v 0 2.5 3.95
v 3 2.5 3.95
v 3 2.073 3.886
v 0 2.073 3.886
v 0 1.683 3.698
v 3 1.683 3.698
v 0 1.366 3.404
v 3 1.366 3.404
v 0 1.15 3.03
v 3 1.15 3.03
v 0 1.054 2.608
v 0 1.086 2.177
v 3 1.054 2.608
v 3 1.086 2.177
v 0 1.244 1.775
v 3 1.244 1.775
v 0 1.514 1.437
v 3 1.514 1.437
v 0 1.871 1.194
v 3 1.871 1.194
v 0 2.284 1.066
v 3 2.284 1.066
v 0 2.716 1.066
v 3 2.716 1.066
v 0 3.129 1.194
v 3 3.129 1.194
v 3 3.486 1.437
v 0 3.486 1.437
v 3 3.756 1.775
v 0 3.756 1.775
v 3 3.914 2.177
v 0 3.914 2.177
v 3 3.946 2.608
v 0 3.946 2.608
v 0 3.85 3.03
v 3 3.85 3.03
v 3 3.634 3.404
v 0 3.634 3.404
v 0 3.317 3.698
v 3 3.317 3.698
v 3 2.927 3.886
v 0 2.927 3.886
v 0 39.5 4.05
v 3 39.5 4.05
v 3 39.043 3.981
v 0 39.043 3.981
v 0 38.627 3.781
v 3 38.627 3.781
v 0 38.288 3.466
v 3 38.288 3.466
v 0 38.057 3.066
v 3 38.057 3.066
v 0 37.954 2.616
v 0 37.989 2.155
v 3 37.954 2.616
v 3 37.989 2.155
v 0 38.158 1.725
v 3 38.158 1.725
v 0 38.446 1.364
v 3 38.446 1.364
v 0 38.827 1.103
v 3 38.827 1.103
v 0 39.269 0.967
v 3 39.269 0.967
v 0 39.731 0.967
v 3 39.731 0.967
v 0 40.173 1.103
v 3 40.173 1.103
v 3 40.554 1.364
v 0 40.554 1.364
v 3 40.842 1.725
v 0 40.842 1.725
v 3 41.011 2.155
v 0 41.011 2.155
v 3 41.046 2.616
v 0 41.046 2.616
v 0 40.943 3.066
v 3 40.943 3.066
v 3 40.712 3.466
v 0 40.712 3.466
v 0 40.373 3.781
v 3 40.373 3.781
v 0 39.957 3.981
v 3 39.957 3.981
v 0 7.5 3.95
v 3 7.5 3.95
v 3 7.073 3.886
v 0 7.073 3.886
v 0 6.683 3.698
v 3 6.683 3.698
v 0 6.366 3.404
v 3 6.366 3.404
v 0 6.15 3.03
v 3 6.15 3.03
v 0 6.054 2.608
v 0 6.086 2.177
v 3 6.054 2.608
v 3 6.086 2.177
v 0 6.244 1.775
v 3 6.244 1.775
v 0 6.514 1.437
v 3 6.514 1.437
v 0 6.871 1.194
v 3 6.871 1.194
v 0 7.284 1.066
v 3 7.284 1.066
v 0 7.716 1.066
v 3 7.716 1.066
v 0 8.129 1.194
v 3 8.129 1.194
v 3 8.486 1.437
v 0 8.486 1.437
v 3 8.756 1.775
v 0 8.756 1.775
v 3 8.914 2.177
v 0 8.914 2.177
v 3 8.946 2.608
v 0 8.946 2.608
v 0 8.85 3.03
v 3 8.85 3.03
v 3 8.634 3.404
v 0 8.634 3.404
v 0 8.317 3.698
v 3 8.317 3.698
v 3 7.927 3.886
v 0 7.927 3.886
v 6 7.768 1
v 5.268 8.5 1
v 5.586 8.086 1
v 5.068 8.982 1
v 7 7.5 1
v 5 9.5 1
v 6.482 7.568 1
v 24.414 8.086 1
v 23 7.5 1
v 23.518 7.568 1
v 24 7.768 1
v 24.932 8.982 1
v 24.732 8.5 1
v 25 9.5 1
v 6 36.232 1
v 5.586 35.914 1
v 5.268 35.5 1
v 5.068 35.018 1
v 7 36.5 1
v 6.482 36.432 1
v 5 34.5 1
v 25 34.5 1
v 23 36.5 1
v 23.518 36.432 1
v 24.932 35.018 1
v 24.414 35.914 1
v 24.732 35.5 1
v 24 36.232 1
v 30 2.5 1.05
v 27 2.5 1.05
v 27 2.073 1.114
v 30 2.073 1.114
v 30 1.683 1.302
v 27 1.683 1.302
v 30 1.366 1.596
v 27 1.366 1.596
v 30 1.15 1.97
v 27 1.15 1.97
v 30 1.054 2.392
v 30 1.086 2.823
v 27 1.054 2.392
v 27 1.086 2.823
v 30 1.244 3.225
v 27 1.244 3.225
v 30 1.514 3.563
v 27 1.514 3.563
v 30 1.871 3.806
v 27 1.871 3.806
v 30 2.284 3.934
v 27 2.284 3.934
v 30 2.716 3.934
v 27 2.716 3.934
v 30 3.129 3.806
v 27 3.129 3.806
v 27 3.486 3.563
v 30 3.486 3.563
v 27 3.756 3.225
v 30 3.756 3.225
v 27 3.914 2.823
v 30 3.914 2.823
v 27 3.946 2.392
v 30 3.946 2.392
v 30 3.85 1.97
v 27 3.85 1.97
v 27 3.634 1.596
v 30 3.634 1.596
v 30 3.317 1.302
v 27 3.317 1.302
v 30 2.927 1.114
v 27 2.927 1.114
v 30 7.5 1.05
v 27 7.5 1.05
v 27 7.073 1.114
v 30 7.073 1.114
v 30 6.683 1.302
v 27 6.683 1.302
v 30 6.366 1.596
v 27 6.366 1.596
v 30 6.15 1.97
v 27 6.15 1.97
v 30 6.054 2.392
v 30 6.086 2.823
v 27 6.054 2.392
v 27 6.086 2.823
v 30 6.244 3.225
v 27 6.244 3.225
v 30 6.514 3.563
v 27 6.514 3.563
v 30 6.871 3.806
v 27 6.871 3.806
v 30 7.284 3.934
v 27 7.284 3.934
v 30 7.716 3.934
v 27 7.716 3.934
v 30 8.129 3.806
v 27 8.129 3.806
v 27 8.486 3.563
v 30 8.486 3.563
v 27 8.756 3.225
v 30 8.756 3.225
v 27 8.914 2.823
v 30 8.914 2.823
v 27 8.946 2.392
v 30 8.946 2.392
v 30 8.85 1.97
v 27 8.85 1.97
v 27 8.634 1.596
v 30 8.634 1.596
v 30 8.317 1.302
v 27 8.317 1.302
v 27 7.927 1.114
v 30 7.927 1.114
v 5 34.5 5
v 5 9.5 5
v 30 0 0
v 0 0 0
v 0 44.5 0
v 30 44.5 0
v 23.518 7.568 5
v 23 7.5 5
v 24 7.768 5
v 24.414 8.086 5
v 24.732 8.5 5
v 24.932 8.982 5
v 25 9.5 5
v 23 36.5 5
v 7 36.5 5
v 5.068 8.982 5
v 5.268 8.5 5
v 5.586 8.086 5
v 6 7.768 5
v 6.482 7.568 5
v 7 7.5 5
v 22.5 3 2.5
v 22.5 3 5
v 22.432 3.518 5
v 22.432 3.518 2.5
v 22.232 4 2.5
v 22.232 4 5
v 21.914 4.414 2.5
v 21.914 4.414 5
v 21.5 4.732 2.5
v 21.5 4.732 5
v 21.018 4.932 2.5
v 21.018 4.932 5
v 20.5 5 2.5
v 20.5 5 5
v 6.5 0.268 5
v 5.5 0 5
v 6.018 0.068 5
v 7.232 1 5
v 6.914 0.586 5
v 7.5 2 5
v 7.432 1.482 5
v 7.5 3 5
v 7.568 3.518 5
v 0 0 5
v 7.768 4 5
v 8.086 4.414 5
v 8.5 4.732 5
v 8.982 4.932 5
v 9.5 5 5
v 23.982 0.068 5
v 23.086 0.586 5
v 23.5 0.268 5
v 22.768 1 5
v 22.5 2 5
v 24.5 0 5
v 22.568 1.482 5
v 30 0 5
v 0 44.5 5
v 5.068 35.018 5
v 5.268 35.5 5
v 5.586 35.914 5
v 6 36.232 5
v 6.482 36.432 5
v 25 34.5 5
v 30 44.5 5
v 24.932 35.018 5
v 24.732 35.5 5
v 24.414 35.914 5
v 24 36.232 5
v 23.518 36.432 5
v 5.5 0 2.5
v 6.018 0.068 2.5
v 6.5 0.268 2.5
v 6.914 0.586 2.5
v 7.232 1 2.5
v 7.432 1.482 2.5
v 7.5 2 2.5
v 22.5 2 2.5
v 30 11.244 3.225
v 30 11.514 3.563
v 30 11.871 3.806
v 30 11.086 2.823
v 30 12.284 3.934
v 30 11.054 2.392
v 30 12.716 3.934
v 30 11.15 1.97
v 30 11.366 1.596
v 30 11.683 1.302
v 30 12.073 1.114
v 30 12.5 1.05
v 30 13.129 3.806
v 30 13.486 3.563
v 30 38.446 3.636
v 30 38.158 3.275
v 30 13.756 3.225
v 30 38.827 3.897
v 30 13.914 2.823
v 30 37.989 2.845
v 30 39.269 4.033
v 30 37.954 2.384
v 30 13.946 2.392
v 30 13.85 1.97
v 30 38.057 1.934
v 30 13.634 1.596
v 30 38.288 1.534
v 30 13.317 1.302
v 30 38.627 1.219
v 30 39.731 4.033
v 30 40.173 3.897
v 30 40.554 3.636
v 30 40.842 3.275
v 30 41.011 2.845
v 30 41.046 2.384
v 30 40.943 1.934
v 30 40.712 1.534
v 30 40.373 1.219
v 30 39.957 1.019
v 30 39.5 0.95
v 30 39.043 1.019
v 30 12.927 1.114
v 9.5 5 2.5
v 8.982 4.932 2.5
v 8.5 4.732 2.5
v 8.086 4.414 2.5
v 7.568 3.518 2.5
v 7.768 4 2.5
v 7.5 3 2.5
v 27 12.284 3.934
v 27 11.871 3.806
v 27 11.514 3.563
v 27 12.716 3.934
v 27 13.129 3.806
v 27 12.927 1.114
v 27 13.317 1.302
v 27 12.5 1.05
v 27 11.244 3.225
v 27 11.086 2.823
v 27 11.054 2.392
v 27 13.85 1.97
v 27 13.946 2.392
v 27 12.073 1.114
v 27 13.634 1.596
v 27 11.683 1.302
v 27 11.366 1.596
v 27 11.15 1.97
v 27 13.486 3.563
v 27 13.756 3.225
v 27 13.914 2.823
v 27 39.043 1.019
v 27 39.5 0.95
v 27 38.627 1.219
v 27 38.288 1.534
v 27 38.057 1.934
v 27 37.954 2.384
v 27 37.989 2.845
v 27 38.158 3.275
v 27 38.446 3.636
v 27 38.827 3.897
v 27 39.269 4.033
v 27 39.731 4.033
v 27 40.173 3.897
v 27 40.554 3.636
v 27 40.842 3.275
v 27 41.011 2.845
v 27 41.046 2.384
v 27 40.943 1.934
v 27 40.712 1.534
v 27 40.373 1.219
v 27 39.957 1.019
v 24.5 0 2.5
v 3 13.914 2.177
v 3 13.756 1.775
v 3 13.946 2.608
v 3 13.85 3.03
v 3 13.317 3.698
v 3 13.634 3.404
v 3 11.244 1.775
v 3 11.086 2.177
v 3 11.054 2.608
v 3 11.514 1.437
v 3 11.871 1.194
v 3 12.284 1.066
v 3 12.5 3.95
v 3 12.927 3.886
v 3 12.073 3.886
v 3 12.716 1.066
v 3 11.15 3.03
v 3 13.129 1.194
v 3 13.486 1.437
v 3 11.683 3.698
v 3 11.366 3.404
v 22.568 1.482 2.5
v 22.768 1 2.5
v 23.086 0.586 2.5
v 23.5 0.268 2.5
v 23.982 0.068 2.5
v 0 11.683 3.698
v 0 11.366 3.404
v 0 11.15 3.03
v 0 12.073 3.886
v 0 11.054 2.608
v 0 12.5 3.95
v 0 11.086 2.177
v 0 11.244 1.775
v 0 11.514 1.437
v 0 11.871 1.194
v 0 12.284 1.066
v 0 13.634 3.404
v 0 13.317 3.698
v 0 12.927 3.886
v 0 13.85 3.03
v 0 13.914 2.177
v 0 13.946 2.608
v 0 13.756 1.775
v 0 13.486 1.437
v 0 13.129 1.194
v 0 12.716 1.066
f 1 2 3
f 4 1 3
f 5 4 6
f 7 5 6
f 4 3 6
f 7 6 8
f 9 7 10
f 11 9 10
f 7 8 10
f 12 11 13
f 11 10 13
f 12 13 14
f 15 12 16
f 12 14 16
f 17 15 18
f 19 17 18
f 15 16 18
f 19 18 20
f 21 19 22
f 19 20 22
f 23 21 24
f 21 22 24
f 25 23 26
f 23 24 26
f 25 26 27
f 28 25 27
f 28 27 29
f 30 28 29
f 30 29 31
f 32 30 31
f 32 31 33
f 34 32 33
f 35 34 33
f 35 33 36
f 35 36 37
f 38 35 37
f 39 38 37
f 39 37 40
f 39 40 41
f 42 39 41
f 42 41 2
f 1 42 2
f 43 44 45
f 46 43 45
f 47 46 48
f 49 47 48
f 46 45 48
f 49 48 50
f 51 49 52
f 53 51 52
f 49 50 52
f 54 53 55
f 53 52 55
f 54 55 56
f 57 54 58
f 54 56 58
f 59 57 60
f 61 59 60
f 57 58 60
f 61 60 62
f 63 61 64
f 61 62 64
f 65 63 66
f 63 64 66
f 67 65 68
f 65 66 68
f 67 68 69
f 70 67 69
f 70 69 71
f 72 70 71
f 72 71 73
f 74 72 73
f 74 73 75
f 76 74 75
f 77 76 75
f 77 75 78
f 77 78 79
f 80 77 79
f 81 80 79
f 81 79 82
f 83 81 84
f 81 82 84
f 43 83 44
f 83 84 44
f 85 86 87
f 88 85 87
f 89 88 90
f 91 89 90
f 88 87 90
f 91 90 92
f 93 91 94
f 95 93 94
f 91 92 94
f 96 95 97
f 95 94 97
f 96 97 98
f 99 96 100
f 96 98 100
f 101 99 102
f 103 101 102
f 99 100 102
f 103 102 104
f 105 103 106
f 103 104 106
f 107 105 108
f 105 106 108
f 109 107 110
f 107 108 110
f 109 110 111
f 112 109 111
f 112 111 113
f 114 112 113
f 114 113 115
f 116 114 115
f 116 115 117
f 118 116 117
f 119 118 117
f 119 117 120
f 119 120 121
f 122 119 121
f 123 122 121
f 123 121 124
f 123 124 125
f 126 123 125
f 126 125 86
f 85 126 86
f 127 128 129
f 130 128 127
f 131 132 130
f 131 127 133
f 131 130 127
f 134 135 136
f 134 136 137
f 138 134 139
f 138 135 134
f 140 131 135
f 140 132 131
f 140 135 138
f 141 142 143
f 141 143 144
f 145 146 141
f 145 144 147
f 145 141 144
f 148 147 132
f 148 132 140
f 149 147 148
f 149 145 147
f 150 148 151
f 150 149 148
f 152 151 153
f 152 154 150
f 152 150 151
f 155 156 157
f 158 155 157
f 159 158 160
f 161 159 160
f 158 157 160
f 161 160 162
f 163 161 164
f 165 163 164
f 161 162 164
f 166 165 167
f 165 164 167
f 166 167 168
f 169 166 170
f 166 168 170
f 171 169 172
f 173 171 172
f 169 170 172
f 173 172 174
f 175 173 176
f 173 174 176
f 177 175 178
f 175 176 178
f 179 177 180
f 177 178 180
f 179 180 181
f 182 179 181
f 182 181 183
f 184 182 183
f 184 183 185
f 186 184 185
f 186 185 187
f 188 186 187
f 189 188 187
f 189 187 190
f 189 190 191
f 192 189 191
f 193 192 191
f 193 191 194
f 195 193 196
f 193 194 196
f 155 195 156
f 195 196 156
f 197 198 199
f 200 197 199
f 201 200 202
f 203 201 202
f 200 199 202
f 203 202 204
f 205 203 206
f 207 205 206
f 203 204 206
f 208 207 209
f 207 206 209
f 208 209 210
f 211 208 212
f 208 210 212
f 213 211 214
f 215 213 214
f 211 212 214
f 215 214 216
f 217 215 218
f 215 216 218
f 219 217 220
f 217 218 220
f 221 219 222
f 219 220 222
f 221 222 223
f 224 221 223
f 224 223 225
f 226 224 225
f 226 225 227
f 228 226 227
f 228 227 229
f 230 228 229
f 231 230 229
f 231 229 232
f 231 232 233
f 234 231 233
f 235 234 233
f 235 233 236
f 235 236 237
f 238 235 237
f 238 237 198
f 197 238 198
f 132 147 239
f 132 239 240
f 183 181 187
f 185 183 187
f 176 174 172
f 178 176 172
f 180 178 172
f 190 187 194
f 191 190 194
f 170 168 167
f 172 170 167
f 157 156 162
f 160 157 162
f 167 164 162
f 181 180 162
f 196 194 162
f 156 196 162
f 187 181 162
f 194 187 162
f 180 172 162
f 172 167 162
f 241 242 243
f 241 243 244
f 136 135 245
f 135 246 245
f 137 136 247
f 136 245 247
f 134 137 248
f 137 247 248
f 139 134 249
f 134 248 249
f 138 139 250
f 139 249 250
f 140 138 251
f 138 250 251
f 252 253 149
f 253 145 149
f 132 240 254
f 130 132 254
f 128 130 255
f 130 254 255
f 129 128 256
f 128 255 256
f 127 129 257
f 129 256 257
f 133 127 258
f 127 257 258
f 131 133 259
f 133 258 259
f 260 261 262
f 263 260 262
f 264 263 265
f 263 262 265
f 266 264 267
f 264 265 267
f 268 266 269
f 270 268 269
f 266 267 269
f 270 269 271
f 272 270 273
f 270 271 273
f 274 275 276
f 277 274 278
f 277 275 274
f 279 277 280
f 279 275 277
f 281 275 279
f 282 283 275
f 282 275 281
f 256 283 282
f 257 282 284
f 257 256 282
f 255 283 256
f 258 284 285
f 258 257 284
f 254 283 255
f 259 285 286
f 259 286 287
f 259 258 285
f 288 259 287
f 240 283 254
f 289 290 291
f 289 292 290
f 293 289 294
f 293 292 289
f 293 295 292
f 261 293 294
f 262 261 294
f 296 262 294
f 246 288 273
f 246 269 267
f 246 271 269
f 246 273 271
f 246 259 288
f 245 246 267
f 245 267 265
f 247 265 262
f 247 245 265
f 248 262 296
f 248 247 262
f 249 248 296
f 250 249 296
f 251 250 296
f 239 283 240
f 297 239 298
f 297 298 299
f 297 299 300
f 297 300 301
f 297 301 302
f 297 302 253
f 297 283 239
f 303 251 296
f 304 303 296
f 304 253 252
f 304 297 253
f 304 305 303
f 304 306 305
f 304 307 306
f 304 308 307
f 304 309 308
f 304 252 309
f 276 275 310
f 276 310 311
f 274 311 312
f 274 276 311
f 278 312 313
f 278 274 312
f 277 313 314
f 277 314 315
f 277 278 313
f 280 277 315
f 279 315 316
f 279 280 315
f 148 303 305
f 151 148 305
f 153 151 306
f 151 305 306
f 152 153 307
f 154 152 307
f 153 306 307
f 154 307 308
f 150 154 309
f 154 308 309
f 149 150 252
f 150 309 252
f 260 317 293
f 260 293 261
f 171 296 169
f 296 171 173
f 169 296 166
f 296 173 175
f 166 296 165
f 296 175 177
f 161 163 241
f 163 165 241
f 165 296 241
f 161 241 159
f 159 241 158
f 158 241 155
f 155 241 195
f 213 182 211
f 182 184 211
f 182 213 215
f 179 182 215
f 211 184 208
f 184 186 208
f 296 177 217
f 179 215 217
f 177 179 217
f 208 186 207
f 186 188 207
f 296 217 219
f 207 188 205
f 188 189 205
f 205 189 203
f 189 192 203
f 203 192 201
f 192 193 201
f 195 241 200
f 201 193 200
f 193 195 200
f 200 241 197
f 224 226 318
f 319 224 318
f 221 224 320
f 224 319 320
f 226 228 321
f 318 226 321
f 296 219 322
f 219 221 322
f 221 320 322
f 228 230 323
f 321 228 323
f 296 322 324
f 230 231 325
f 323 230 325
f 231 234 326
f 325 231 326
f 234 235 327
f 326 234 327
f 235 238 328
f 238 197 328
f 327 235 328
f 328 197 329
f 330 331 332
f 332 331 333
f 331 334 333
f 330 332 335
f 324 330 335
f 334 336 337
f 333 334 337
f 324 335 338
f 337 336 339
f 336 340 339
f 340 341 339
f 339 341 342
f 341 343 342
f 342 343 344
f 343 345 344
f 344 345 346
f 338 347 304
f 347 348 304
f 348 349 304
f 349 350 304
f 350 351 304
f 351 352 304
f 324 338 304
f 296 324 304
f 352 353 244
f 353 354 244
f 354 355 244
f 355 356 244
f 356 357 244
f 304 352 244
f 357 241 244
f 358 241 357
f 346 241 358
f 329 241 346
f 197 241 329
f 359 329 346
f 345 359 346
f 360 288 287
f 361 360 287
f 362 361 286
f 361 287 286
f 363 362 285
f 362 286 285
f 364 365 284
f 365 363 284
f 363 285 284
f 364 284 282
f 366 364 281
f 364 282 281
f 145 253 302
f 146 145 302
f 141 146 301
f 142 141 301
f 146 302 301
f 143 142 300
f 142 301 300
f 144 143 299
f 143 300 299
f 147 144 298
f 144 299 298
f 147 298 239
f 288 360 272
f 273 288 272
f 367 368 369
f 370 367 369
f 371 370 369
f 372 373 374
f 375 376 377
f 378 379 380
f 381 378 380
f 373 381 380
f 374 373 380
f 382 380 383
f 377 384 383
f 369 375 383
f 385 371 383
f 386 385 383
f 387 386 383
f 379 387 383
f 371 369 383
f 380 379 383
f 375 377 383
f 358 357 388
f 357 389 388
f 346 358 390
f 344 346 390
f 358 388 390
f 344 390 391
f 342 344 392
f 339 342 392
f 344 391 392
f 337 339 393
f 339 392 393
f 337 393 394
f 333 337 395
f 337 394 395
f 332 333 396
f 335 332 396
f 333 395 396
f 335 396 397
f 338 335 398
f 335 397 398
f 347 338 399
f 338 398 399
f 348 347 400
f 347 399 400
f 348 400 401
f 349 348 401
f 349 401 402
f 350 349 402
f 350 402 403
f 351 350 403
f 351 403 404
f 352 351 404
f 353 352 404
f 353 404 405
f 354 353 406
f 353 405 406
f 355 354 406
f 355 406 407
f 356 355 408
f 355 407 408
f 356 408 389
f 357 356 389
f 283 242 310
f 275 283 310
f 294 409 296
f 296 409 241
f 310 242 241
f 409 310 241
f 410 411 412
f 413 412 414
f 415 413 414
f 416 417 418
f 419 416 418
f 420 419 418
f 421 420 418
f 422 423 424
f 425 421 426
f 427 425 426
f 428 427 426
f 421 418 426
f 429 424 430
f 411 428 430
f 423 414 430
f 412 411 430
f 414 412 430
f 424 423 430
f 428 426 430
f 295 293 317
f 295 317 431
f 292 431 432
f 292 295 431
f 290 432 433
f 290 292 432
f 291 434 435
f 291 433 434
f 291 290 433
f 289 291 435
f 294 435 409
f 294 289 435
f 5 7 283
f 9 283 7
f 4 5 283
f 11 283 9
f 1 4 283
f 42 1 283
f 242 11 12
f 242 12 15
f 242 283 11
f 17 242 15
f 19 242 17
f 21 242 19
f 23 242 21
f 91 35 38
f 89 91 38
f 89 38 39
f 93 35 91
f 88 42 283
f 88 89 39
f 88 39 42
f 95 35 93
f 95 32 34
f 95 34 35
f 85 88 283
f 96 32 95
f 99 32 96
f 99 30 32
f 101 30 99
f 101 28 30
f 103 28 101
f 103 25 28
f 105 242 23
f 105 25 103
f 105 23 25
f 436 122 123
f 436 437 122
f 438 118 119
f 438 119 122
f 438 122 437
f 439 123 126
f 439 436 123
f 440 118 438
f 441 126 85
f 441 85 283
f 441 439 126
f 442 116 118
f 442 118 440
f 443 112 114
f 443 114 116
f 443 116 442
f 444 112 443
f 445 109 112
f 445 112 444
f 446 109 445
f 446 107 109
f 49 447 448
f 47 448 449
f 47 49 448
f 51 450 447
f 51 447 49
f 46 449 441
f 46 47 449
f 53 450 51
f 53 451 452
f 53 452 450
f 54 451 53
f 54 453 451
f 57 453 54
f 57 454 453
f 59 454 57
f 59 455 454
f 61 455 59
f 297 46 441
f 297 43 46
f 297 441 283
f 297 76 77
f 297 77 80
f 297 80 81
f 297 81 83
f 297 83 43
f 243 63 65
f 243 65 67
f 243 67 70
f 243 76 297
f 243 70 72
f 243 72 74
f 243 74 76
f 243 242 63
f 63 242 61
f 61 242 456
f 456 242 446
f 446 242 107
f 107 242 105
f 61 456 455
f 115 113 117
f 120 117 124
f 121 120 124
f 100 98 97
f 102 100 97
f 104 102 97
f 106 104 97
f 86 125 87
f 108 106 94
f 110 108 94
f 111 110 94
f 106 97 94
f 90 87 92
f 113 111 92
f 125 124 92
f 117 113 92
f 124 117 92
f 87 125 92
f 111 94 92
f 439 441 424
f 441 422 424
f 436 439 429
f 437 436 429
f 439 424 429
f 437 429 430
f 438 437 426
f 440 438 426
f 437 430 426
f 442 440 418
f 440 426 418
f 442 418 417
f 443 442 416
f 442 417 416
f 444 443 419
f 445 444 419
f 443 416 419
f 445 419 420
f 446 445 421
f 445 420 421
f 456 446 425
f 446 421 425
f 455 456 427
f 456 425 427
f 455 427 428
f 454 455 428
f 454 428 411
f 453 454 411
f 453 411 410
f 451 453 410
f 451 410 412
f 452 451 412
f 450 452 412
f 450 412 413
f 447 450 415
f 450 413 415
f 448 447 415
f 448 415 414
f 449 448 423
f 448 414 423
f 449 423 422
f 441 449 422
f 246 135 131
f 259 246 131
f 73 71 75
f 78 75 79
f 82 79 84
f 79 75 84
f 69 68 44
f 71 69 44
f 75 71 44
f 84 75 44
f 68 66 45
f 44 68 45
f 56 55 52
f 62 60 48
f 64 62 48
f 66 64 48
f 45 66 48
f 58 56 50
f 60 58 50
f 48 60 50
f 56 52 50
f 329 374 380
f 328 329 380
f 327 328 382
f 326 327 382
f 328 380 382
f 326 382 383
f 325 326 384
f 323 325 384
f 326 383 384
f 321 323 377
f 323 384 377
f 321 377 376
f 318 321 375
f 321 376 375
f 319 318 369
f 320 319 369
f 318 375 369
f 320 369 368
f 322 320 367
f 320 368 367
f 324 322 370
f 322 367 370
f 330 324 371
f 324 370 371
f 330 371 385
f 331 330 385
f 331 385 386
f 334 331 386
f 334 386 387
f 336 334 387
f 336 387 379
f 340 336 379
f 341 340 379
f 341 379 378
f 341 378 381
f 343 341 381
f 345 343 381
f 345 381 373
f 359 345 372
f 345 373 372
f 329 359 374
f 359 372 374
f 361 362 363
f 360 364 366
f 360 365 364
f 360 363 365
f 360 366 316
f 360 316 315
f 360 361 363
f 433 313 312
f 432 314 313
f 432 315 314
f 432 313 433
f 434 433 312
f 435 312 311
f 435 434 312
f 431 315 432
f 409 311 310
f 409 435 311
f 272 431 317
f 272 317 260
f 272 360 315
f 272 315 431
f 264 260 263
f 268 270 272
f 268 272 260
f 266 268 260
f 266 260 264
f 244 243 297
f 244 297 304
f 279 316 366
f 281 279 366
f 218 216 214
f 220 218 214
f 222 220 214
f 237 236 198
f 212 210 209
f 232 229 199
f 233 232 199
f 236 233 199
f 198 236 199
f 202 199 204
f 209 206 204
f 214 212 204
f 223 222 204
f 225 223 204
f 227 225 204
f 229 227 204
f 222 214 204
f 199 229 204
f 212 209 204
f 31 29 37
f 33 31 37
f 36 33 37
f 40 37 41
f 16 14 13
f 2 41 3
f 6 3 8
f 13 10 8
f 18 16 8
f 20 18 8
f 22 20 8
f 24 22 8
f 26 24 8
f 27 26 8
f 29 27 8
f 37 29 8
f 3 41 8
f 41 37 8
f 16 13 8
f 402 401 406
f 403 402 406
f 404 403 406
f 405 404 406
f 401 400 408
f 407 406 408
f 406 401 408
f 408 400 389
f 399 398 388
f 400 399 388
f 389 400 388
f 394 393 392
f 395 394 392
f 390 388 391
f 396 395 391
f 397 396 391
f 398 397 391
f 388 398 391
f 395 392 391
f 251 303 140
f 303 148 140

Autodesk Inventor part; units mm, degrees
ref_plane "YZ Plane" through (0, 0, 0) normal (1, 0, 0) x (0, 1, 0)
ref_plane "XZ Plane" through (0, 0, 0) normal (0, 1, 0) x (-1, 0, 0)
ref_plane "XY Plane" through (0, 0, 0) normal (0, 0, 1) x (1, 0, 0)
sketch "スケッチ1" plane through (0, 0, 0) normal (0, 0, 1) x (1, 0, 0)
  line L0 (0, 44.5) -> (30, 44.5)
  line L1 (0, 0) -> (30, 0)
  line L2 (0, 0) -> (0, 44.5)
  line L3 (30, 0) -> (30, 44.5)
  line L4 (7.5, 0) -> (7.5, 5)
  line L5 (7.5, 5) -> (22.5, 5)
  line L6 (15, 0) -> (15, 44.5) construction
  line L7 (22.5, 0) -> (22.5, 5)
  line L8 (5, 36.5) -> (25, 36.5)
  line L9 (25, 36.5) -> (25, 7.5)
  line L10 (25, 7.5) -> (5, 7.5)
  line L11 (5, 36.5) -> (5, 7.5)
  point P0 (22.5, 0)
  dimension "d2" = 30
  dimension "d38" = 44.5
  dimension "d61" = 15
  dimension "d62" = 5
  dimension "d66" = 5
  dimension "d67" = 8
  dimension "d68" = 2.5
extrude "押し出し1" add sketch "スケッチ1" along normal blind 5 contours L0 L3 L1 L7 L5 L4 L2
sketch "スケッチ4" plane through (30, 0, 0) normal (1, 0, 0) x (0, 0, -1)
  line L0 (0, 44.5) -> (-5, 44.5) projected
  line L1 (-2.5, 44.5) -> (-2.5, 0) construction
  line L2 (0, 0) -> (-5, 0) projected
  point P0 (0, 0)
  point P1 (-2.5, 39.5)
  point P2 (-2.5, 2.5)
  point P3 (-2.5, 7.5)
  point P4 (-2.5, 12.5)
  dimension "d22" = 5
  dimension "d40" = 2.5
  dimension "d41" = 5
  dimension "d42" = 5
  dimension "d60" = 27
hole "穴1" at (30, 39.5, 2.5) direction (-1, 0, 0) diameter 3.1 depth 3
sketch "スケッチ5" plane through (0, 0, 0) normal (-1, 0, 0) x (0, 0, 1)
  circle A0 centre (2.5, 39.5) radius 1.55 projected
  line L0 (0, 0) -> (5, 0) projected
  line L1 (2.5, 0) -> (2.5, 44.5) construction
  line L2 (0, 44.5) -> (5, 44.5) projected
  point P0 (2.5, 2.5)
  point P1 (2.5, 7.5)
  point P2 (2.5, 12.5)
  point P3 (4.05, 32)
  point P4 (0.95, 32)
  dimension "d50" = 2.5
  dimension "d51" = 5
  dimension "d52" = 5
hole "穴2" at (0, 39.5, 2.5) direction (1, 0, 0) diameter 3.1 depth 3
hole "穴5" at (30, 2.5, 2.5) at (30, 12.5, 2.5) at (30, 7.5, 2.5) direction (-1, 0, 0) diameter 2.9 depth 3
hole "穴6" at (0, 2.5, 2.5) at (0, 7.5, 2.5) at (0, 12.5, 2.5) direction (1, 0, 0) diameter 2.9 depth 3
extrude "押し出し2" add sketch "スケッチ1" along normal blind 2.5 contours L4 L5 L7 L1
fillet "フィレット3" radius 2 8 edges at (7.5, 5, 3.75) (7.5, 0, 3.75) (22.5, 5, 3.75) (22.5, 0, 3.75) (5, 36.5, 2.5) (25, 36.5, 2.5) (5, 7.5, 2.5) (25, 7.5, 2.5)
extrude "押し出し3" add sketch "スケッチ1" along normal blind 1 contours L8 L9 L10 L11
equation "\"d41\" = d42"
equation "\"d50\" = d40"
equation "\"d51\" = d41"
equation "\"d52\" = d42"
properties part number "Cockpit_vertical_frame_07" material "アセタール樹脂、黒"
